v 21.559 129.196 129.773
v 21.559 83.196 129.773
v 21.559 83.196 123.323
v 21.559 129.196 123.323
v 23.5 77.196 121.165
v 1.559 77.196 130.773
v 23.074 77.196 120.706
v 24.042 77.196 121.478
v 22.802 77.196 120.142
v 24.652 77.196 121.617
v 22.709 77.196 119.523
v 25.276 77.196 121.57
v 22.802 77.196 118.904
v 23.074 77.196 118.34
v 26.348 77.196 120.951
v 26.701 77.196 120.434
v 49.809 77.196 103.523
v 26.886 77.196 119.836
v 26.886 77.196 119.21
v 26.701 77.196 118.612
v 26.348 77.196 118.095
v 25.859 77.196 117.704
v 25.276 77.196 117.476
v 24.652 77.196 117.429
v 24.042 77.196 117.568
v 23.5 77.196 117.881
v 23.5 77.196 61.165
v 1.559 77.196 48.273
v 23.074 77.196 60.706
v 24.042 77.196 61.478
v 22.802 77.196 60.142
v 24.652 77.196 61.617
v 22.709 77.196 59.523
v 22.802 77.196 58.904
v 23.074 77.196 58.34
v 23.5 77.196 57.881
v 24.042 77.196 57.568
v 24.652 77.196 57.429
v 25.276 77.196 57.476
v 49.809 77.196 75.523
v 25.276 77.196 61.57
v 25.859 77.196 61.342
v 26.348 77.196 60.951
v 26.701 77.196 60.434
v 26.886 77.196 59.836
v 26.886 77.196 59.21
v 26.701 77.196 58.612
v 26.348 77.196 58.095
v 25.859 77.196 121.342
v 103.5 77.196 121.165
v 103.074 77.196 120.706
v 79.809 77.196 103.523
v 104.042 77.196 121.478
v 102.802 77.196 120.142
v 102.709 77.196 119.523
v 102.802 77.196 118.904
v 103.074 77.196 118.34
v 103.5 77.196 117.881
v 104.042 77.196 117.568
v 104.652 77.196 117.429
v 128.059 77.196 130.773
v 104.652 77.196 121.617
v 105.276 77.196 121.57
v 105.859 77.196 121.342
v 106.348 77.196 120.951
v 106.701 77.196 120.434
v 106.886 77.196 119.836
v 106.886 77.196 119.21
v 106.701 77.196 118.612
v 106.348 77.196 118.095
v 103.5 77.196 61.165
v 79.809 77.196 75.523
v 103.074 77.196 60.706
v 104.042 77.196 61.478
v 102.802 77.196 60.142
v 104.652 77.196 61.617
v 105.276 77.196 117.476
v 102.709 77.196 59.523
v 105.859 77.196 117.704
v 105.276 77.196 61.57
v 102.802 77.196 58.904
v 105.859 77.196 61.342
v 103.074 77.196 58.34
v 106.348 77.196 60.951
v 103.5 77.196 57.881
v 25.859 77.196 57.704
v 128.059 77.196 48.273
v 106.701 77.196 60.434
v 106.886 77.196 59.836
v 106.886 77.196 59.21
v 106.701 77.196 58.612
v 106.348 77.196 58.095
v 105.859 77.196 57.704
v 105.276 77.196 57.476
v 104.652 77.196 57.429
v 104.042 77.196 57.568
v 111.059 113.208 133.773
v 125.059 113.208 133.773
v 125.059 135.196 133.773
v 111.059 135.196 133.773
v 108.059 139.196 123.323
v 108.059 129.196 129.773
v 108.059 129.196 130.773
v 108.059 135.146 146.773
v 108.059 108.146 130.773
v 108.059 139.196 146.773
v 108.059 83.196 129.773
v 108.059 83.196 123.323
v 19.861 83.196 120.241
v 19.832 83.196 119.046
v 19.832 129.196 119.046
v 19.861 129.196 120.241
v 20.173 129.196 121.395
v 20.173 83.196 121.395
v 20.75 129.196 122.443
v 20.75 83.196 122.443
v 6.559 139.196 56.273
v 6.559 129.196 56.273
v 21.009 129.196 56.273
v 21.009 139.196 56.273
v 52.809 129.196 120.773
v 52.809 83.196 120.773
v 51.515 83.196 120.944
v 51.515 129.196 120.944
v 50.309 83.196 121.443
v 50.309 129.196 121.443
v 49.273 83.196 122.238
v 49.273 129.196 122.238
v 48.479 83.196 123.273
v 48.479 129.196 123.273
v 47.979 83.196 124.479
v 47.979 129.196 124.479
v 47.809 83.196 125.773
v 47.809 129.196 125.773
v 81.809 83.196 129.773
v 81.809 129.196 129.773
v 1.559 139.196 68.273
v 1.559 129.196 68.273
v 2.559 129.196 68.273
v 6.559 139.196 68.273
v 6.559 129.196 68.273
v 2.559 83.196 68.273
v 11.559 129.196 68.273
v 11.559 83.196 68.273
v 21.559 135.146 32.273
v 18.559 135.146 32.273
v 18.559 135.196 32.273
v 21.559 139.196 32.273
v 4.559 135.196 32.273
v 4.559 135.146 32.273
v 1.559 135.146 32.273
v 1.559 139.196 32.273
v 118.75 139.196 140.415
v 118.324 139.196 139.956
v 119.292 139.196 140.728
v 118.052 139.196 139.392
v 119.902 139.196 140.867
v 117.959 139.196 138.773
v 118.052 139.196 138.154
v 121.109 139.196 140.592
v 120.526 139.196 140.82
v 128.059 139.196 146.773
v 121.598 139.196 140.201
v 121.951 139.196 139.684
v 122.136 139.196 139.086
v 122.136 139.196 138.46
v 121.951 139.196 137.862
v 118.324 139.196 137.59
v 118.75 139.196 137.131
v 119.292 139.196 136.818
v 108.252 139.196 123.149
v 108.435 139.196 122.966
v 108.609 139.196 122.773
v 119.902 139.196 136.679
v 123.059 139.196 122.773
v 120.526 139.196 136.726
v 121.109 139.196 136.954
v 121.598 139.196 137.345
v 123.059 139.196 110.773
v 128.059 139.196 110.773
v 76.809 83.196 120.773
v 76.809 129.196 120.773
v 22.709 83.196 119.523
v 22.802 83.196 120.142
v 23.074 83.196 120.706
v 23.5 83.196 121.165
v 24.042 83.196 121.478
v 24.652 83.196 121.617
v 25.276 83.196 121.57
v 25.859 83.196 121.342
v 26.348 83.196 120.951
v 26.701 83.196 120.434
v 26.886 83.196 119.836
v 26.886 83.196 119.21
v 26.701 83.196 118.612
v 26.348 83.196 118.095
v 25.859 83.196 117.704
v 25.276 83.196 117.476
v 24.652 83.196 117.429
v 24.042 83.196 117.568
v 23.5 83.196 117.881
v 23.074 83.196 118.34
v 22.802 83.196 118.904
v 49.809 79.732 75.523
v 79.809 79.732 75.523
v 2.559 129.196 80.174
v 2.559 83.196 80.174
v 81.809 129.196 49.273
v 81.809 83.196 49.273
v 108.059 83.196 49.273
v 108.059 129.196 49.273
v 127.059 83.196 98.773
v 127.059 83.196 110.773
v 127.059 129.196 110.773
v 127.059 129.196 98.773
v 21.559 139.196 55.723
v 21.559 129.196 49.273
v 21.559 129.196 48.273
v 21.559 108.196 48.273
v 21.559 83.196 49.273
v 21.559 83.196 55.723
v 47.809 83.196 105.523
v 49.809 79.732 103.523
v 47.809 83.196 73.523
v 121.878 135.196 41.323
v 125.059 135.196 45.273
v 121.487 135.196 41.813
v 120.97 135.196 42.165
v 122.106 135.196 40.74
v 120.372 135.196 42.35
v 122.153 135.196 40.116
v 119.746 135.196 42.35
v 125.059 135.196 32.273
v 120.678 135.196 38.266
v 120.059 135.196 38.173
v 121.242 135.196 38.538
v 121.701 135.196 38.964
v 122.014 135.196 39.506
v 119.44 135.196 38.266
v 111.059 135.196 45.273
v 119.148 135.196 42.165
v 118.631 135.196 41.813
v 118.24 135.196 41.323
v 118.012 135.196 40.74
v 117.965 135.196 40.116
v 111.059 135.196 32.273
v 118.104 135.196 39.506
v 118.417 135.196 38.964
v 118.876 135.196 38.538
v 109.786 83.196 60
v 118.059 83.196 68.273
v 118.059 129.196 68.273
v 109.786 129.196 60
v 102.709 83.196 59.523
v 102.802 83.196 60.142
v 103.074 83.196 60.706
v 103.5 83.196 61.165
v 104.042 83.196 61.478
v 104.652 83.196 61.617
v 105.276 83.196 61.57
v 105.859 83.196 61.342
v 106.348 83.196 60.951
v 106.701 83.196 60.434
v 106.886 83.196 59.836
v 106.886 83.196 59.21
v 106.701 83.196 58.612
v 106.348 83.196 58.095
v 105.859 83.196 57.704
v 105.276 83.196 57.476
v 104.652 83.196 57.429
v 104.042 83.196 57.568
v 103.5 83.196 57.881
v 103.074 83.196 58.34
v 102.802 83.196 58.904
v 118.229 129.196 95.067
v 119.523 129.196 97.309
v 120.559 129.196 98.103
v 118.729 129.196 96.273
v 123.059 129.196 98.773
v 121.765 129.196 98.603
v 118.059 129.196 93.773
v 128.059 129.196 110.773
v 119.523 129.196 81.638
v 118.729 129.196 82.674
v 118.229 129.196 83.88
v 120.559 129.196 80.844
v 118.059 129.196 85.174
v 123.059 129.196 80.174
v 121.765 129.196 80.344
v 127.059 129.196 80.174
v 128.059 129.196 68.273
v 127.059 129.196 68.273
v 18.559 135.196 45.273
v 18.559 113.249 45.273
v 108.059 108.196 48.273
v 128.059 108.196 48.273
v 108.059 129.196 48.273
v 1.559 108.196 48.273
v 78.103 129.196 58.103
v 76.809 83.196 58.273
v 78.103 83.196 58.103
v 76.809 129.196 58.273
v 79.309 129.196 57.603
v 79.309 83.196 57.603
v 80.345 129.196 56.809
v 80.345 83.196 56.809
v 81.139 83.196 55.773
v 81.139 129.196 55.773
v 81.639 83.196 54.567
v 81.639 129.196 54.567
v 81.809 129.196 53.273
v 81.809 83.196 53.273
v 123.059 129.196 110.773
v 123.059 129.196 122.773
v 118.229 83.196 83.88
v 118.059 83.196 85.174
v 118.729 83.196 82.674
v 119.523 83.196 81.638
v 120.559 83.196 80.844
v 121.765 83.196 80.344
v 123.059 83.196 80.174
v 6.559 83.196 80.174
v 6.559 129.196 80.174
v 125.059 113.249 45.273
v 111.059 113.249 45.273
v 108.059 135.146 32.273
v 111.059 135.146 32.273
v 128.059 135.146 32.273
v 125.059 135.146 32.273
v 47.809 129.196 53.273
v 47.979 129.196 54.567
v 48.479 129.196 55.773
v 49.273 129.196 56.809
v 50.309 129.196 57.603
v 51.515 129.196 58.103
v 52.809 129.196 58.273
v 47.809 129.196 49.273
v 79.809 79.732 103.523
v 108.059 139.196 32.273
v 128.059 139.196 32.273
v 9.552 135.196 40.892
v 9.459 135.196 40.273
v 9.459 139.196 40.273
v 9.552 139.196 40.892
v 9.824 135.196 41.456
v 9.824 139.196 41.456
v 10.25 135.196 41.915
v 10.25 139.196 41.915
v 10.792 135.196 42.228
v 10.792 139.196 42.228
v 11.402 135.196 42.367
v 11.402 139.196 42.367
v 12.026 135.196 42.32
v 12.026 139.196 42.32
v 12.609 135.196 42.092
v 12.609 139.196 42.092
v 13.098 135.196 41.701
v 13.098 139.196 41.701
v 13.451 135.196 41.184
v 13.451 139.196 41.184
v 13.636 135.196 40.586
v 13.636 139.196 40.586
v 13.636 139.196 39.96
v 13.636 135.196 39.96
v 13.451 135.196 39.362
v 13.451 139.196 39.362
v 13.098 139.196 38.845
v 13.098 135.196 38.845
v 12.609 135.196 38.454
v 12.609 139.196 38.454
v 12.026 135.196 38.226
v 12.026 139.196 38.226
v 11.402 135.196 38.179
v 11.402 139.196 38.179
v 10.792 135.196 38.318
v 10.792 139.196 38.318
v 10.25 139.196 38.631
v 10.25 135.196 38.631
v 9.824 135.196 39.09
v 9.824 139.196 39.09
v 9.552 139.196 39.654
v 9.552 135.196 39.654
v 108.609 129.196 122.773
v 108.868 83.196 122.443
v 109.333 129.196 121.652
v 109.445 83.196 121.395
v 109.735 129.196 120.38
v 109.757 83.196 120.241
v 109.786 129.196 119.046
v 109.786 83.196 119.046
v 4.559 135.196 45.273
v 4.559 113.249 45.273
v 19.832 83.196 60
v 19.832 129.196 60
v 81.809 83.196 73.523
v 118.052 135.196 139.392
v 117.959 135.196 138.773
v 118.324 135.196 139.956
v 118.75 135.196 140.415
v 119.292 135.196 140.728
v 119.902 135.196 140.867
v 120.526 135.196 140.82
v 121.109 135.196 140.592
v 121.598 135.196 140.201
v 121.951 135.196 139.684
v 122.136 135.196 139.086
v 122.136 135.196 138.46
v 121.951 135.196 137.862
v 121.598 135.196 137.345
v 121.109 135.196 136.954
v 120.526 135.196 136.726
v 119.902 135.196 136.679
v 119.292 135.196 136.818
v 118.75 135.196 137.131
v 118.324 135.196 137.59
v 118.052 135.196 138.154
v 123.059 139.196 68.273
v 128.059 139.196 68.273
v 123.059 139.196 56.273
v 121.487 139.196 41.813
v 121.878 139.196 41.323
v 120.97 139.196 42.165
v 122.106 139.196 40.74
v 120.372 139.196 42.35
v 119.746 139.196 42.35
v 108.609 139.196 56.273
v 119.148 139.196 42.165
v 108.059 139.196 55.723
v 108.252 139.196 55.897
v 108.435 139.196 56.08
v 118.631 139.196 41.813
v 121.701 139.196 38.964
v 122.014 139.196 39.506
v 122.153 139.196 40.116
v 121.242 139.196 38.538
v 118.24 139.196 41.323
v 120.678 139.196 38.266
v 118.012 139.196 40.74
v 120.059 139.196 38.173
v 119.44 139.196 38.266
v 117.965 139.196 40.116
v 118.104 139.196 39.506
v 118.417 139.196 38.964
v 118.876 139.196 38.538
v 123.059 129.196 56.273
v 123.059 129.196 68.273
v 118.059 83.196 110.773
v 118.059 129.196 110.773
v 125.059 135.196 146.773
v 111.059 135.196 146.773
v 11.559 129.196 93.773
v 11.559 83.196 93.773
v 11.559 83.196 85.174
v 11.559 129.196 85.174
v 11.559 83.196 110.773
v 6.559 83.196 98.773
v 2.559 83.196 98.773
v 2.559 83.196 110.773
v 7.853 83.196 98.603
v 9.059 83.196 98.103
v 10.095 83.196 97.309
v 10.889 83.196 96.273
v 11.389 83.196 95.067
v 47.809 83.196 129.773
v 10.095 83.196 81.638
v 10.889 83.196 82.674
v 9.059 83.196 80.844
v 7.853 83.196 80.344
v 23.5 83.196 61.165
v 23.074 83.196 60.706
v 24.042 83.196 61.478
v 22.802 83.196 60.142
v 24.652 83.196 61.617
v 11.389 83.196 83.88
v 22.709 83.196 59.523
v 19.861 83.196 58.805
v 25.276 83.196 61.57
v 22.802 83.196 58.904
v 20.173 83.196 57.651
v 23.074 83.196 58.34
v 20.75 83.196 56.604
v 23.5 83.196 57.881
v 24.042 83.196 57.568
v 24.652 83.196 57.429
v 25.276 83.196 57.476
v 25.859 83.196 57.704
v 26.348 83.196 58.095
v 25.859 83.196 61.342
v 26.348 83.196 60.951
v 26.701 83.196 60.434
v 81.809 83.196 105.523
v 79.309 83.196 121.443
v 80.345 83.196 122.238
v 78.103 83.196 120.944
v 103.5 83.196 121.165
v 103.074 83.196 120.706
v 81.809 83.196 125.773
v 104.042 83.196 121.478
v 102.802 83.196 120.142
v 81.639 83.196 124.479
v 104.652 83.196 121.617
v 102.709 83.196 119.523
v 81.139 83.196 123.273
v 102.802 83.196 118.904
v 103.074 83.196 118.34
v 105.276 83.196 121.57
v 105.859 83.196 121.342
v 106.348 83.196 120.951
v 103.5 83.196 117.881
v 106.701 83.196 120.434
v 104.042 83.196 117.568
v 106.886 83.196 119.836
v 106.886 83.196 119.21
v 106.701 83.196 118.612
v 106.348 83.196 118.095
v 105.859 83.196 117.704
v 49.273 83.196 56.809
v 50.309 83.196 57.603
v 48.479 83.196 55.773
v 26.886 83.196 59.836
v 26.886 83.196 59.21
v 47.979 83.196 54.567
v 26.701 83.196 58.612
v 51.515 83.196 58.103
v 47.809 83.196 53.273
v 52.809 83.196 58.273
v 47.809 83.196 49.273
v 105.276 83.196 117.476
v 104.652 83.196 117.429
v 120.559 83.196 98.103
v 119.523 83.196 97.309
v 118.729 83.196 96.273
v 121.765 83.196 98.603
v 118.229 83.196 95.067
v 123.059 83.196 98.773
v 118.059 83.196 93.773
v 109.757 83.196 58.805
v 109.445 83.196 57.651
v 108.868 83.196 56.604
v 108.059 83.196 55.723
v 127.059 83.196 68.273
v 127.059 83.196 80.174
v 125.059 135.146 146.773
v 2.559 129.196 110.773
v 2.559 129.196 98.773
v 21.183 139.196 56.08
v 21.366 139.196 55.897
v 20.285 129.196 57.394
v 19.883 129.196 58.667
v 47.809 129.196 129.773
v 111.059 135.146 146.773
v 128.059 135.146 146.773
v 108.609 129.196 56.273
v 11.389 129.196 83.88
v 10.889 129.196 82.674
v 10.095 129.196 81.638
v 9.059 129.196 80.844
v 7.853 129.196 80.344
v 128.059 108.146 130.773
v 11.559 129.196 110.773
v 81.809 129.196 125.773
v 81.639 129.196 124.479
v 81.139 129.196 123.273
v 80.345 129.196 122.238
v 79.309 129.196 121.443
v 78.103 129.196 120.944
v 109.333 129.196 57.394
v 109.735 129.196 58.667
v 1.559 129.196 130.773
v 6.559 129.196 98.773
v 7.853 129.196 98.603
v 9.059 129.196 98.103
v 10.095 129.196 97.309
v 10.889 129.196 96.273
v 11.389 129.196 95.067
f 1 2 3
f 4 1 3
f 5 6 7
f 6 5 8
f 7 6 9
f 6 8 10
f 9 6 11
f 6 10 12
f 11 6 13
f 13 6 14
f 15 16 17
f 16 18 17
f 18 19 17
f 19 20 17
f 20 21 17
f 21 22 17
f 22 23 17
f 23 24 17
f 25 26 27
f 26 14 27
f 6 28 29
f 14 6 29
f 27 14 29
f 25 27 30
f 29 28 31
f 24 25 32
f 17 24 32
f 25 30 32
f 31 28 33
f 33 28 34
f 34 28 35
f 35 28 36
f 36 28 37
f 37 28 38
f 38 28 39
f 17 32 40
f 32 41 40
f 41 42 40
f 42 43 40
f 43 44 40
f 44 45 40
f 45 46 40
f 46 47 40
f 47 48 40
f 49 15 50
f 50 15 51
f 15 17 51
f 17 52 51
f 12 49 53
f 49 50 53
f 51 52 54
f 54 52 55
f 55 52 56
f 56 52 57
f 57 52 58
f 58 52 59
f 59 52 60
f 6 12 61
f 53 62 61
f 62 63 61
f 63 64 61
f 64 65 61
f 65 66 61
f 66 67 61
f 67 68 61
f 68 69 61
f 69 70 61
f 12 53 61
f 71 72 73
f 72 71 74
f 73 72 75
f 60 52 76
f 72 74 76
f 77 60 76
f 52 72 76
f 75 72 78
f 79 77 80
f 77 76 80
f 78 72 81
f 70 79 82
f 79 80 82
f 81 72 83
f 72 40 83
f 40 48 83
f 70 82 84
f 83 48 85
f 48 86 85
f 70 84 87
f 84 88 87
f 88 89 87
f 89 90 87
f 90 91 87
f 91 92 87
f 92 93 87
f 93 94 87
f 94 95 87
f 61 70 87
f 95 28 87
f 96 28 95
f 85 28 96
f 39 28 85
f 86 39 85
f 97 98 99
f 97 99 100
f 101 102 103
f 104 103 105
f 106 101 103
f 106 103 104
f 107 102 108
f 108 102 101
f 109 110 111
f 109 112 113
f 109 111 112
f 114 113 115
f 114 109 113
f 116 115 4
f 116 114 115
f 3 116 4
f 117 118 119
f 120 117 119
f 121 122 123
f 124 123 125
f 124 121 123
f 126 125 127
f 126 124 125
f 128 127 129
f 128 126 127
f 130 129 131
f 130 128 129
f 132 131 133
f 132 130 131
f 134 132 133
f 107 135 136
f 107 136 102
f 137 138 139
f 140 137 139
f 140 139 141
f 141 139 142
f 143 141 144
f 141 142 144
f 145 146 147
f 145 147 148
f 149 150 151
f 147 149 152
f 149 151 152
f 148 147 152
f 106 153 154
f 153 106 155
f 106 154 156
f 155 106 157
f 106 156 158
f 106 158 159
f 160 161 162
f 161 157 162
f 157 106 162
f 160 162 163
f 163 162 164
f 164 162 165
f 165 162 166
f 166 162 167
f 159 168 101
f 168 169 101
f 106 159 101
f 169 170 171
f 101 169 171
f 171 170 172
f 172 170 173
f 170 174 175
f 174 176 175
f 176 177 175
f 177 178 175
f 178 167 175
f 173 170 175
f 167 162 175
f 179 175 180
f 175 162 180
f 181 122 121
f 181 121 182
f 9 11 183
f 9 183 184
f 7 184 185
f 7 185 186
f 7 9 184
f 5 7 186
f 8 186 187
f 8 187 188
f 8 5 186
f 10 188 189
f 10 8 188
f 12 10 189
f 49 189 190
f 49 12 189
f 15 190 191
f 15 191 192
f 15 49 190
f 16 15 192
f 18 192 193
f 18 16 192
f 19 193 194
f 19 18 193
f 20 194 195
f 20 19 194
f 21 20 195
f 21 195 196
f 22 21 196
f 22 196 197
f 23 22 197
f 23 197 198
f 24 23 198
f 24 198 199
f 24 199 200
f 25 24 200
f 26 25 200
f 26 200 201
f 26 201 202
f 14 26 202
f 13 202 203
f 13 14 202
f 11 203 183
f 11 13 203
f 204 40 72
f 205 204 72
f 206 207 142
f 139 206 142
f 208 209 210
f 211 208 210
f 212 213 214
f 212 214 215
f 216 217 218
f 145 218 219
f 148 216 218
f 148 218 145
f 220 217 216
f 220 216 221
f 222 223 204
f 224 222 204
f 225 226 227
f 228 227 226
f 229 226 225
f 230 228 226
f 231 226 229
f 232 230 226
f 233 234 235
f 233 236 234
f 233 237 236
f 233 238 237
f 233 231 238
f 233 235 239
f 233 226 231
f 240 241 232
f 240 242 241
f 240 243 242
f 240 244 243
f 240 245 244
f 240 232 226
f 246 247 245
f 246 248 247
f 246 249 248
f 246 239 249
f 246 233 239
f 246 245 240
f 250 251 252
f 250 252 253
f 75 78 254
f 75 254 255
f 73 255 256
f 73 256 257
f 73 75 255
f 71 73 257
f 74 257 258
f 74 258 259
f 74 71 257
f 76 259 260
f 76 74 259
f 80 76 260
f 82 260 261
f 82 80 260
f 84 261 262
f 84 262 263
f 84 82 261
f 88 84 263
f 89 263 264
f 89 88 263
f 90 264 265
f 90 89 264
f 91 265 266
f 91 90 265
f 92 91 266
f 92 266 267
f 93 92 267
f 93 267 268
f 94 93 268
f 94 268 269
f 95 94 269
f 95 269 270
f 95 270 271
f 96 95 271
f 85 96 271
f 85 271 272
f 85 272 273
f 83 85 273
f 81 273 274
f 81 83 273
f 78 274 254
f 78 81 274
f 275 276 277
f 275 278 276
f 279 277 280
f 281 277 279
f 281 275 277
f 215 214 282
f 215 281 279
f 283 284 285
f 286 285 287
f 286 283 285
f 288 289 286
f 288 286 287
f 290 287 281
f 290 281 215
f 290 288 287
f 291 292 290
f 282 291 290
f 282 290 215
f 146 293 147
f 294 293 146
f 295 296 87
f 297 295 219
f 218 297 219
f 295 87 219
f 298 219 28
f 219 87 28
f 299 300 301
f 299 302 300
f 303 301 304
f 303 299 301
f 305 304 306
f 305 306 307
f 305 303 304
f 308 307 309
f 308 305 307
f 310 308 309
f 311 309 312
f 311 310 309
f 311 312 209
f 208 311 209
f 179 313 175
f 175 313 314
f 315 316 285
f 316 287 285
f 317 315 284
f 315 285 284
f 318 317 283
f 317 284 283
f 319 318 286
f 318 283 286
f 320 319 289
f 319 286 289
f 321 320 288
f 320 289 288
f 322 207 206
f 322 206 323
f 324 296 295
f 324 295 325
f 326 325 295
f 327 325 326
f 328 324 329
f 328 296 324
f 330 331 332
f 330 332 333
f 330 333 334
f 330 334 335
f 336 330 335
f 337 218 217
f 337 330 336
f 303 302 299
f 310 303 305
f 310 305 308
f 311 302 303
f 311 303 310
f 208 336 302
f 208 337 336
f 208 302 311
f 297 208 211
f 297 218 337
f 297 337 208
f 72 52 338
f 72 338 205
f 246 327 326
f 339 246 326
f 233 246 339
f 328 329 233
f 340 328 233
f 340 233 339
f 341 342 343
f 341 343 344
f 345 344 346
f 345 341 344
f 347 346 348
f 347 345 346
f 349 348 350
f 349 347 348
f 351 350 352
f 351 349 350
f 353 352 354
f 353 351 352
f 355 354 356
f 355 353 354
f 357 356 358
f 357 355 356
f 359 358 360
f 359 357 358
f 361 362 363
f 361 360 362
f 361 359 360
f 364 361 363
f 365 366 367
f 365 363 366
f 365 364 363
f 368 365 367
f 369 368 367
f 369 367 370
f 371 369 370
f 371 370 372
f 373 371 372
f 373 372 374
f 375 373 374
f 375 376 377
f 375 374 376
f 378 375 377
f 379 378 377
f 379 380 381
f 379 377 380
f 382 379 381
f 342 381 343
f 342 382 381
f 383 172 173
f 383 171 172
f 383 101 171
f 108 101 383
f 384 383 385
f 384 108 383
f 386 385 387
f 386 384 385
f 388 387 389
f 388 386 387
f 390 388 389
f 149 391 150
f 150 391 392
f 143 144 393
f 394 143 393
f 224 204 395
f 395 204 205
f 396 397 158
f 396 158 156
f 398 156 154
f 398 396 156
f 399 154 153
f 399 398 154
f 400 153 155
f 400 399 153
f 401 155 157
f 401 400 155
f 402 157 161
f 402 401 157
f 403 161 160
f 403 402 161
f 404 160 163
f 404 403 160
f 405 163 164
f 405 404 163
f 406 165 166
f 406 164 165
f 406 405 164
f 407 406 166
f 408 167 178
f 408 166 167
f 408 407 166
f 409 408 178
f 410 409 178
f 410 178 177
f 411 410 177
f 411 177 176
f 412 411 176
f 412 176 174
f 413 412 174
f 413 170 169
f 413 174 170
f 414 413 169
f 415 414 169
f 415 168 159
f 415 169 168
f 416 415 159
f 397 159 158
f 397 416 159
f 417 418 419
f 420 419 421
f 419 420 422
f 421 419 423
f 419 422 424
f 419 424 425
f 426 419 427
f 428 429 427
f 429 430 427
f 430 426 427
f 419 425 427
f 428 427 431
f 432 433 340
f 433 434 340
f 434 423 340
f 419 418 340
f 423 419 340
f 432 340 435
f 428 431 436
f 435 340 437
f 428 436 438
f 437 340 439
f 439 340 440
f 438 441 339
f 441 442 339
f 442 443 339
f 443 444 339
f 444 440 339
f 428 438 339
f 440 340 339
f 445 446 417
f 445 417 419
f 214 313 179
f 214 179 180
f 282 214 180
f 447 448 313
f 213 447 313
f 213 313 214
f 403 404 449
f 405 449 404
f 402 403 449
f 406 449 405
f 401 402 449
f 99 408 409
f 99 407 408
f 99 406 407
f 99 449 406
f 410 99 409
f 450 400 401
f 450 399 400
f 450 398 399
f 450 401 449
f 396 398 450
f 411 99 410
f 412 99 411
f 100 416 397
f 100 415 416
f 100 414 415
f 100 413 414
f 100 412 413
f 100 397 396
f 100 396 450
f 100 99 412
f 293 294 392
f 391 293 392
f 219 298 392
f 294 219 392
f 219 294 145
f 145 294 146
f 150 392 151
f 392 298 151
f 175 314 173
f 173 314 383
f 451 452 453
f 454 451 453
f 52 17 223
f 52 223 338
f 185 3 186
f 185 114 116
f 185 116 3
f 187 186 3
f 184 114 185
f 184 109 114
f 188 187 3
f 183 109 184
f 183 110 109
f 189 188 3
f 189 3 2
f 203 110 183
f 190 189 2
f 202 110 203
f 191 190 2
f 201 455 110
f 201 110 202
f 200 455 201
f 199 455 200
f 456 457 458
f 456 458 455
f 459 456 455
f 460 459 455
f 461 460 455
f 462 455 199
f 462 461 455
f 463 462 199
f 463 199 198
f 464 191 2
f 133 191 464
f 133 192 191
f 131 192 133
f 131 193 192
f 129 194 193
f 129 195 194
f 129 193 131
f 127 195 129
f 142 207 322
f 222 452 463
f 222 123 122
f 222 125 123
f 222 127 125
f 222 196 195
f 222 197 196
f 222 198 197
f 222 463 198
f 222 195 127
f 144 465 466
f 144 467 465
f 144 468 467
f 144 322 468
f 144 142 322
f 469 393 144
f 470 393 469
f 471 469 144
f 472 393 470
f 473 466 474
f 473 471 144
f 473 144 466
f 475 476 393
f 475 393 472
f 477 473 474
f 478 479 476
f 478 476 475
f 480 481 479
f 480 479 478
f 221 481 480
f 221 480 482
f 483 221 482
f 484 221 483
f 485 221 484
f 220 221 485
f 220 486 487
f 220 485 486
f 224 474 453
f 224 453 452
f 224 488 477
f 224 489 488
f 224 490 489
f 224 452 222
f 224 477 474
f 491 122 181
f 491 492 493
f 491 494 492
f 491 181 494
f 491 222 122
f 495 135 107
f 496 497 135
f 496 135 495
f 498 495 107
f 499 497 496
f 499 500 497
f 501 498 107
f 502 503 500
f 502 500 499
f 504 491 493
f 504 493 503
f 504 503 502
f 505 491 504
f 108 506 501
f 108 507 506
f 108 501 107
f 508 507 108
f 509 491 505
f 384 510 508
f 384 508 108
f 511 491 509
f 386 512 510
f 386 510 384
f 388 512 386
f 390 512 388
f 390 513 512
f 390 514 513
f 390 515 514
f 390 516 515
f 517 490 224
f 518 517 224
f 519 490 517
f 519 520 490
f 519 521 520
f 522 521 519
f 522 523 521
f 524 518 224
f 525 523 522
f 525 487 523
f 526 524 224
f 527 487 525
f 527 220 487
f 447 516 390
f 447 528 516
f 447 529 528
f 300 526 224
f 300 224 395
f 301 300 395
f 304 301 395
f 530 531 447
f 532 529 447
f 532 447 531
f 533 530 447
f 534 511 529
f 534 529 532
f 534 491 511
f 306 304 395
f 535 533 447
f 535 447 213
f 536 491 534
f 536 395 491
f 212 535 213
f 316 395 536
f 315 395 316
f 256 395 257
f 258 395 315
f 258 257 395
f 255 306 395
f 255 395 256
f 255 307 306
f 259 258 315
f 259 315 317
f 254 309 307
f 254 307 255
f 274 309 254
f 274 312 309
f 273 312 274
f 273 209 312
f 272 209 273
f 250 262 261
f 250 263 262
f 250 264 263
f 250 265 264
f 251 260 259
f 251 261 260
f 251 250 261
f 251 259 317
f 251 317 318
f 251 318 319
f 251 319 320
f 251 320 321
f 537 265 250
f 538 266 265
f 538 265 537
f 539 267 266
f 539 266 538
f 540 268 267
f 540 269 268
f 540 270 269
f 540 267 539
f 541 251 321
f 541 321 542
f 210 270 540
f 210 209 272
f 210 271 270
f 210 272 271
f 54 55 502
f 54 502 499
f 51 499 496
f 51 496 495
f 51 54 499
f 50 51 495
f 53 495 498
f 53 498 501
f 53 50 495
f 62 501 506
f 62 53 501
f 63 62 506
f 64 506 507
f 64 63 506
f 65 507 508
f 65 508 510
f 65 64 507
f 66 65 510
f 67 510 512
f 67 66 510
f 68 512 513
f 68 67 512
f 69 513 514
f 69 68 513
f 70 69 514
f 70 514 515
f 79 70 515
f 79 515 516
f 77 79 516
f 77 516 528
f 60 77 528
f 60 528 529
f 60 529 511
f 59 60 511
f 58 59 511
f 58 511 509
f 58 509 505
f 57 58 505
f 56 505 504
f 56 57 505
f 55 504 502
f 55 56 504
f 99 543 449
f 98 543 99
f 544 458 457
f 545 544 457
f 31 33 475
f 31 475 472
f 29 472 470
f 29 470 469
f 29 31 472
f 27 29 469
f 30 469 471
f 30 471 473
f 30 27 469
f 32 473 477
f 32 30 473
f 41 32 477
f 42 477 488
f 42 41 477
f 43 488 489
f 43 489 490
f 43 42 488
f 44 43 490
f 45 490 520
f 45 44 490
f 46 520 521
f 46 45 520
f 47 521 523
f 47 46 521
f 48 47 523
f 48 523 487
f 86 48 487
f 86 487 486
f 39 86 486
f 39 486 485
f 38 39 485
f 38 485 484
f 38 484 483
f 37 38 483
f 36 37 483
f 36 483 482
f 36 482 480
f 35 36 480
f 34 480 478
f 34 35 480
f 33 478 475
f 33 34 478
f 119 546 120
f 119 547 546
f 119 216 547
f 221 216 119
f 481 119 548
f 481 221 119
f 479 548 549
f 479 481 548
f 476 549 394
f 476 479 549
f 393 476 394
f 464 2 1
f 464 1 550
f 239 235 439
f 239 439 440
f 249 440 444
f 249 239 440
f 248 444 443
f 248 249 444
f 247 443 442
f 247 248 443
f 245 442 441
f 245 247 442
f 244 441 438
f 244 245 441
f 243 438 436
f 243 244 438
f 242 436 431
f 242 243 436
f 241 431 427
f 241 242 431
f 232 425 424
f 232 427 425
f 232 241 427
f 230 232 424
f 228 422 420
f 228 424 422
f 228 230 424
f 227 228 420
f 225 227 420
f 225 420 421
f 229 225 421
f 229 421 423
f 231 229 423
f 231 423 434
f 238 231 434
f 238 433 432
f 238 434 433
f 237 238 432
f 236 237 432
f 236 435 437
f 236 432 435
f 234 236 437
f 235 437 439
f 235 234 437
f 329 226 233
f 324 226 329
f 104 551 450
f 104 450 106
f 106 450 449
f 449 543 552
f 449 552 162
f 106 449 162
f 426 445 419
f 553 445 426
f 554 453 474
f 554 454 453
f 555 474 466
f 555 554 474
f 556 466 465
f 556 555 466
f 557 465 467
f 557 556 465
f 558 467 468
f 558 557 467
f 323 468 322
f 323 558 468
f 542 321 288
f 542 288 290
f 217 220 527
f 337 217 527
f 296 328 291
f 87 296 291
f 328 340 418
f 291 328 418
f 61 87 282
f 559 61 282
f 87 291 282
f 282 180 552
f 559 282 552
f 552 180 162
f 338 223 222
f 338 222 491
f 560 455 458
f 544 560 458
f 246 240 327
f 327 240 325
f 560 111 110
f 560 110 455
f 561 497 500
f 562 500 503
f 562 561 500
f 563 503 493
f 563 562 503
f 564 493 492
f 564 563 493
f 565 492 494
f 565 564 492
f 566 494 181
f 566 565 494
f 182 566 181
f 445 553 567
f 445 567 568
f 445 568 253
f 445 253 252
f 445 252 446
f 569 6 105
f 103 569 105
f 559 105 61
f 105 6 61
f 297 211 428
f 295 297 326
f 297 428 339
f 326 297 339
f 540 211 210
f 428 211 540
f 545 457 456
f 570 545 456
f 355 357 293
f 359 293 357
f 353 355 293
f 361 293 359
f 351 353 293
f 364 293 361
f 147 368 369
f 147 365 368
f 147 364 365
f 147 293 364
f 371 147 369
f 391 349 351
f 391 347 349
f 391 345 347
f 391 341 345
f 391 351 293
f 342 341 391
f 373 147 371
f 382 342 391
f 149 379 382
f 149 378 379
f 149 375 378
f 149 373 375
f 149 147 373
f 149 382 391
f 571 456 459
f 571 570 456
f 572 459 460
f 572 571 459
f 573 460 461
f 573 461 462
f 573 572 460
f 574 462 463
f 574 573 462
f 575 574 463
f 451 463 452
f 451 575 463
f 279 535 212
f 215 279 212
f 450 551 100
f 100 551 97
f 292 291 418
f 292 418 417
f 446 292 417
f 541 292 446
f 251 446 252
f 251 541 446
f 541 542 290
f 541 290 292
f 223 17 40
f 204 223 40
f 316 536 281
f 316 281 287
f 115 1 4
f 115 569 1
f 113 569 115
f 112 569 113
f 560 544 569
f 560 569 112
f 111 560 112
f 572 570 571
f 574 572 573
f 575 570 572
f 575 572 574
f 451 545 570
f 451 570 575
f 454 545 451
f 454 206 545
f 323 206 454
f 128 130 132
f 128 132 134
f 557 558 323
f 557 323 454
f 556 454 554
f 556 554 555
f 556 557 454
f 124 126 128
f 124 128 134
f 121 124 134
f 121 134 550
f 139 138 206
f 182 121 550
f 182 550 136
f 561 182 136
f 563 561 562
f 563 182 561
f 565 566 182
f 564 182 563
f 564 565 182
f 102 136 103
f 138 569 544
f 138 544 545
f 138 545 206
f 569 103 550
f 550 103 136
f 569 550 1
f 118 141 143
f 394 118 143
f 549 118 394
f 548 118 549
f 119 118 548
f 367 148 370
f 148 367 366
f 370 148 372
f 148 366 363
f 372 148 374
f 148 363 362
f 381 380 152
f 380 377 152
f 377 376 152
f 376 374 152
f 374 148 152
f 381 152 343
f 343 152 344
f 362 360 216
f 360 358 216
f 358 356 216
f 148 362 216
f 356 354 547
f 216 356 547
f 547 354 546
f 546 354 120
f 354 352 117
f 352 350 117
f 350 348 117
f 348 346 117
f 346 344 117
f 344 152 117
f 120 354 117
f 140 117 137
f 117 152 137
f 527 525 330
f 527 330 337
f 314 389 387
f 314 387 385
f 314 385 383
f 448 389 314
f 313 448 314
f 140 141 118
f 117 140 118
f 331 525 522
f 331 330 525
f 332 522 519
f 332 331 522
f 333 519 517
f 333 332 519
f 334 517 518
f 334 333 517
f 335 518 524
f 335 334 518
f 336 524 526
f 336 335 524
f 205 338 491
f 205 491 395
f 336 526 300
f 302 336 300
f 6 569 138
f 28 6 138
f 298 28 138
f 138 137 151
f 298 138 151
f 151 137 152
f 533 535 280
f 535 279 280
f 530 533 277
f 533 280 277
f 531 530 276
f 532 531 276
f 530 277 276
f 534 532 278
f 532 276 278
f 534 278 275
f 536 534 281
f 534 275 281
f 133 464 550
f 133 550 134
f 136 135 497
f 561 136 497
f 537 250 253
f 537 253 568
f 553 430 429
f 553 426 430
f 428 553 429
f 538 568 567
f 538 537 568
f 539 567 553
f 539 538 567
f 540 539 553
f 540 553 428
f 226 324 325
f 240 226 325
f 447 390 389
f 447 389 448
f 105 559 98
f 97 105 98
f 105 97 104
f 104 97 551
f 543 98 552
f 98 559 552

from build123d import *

# Parameters (mm, degrees)
SKETCH_1_W               = 126.5
SKETCH_1_H               = 82.5
SKETCH_1_R               = 2.1
SKETCH_1_W_2             = 30
SKETCH_1_H_2             = 28
EXTRUDE_2_DEPTH          = 6
CHAMFER_1_SIZE           = 2
CHAMFER_1_SIZE2          = 3.464101615
SKETCH_2_W               = 34
SKETCH_2_H               = 10
SKETCH_2_W_2             = 10
SKETCH_2_H_2             = 18.59934511
SKETCH_2_W_3             = 1
SKETCH_2_H_3             = 11.900654894
SKETCH_2_H_4             = 18.599345106
SKETCH_2_H_5             = 12
SKETCH_2_W_4             = 26.25
SKETCH_2_H_6             = 1
SKETCH_2_H_7             = 11.999999996
EXTRUDE_3_DEPTH          = 46
EXTRUDE_4_DEPTH          = 10
EXTRUDE_7_DEPTH          = 20
EXTRUDE_8_DEPTH          = 20
CUT_EXTRUDE_1_DEPTH      = 205.414906938
CUT_EXTRUDE_1_DEPTH_BACK = 205.414906938
SKETCH_6_R               = 2.1
SKETCH_7_W               = 14
SKETCH_7_H               = 13.763943164
SKETCH_7_H_2             = 13.67346934
SKETCH_7_H_3             = 14.015580363
SKETCH_7_H_4             = 13.891937121
CUT_EXTRUDE_2_DEPTH      = 58
FILLET_1_R               = 5
SKETCH_9_R               = 5
CUT_EXTRUDE_4_DEPTH      = 203.675736531


with BuildPart() as part:
    # Эскиз1 → Бобышка-Вытянуть2 (new body)
    with BuildSketch(Plane(origin=(0, 77.195974268, 0), x_dir=(1, 0, 0), z_dir=(0, 1, 0))):
        with Locations((64.808980694, -89.523129836)):
            Rectangle(SKETCH_1_W, SKETCH_1_H)
        with Locations(Location((24.808980694, -59.523129836, 0), (0, 0, 180))):
            Circle(SKETCH_1_R, mode=Mode.SUBTRACT)
        with Locations(Location((104.808980694, -59.523129836, 0), (0, 0, 180))):
            Circle(SKETCH_1_R, mode=Mode.SUBTRACT)
        with Locations(Location((104.808980694, -119.523129836, 0), (0, 0, 180))):
            Circle(SKETCH_1_R, mode=Mode.SUBTRACT)
        with Locations(Location((24.808980694, -119.523129836, 0), (0, 0, 180))):
            Circle(SKETCH_1_R, mode=Mode.SUBTRACT)
        with Locations((64.808980694, -89.523129836)):
            Rectangle(SKETCH_1_W_2, SKETCH_1_H_2, mode=Mode.SUBTRACT)
    extrude(amount=EXTRUDE_2_DEPTH)

    # Фаска1
    chamfer_1_edges = [part.edges().sort_by_distance(p)[0] for p in [
        (49.808980694, 83.195974268, 89.523129836),
        (64.808980694, 83.195974268, 103.523129836),
        (79.808980694, 83.195974268, 89.523129836),
        (64.808980694, 83.195974268, 75.523129836),
    ]]
    chamfer_1_side = [part.faces().sort_by_distance(p)[0] for p in [
        (64.808980694, 83.195974268, 49.78337816),
    ]]
    chamfer(chamfer_1_edges, length=CHAMFER_1_SIZE, length2=CHAMFER_1_SIZE2, reference=chamfer_1_side[0])

    # Эскиз2 → Бобышка-Вытянуть3 (add)
    with BuildSketch(Plane(origin=(0, 83.195974268, 0), x_dir=(1, 0, 0), z_dir=(0, 1, 0))):
        Polygon((1.558980694, -68.273129836), (11.558980694, -68.273129836), (21.558980694, -58.273129836), (21.558980694, -48.273129836), (1.558980694, -48.273129836), align=None)
        with Locations((64.808980694, -53.273129836)):
            Rectangle(SKETCH_2_W, SKETCH_2_H)
        Polygon((118.058980694, -68.273129836), (108.058980694, -58.273129836), (108.058980694, -48.273129836), (128.058980694, -48.273129836), (128.058980694, -68.273129836), align=None)
        with Locations((123.058980694, -89.473457285)):
            Rectangle(SKETCH_2_W_2, SKETCH_2_H_2)
        Polygon((108.058980694, -120.773129836), (118.058980694, -110.773129836), (128.058980694, -110.773129836), (128.058980694, -130.773129836), (108.058980694, -130.773129836), align=None)
        with Locations((64.808980694, -125.773129836)):
            Rectangle(SKETCH_2_W, SKETCH_2_H)
        Polygon((21.558980694, -130.773129836), (21.558980694, -120.773129836), (11.558980694, -110.773129836), (1.558980694, -110.773129836), (1.558980694, -130.773129836), align=None)
        with Locations((2.058980694, -74.223457283)):
            Rectangle(SKETCH_2_W_3, SKETCH_2_H_3)
        with Locations((6.558980694, -89.473457283)):
            Rectangle(SKETCH_2_W_2, SKETCH_2_H_4)
        with Locations((2.058980694, -104.773129836)):
            Rectangle(SKETCH_2_W_3, SKETCH_2_H_5)
        with Locations((34.683980694, -130.273129836)):
            Rectangle(SKETCH_2_W_4, SKETCH_2_H_6)
        with Locations((94.933980694, -130.273129836)):
            Rectangle(SKETCH_2_W_4, SKETCH_2_H_6)
        with Locations((127.558980694, -104.773129838)):
            Rectangle(SKETCH_2_W_3, SKETCH_2_H_7)
        with Locations((127.558980694, -74.223457283)):
            Rectangle(SKETCH_2_W_3, SKETCH_2_H_3)
        with Locations((94.933980694, -48.773129836)):
            Rectangle(SKETCH_2_W_4, SKETCH_2_H_6)
        with Locations((34.683980694, -48.773129836)):
            Rectangle(SKETCH_2_W_4, SKETCH_2_H_6)
    extrude(amount=EXTRUDE_3_DEPTH)

    # Эскиз3 → Бобышка-Вытянуть4 (add)
    with BuildSketch(Plane(origin=(0, 129.195974268, 0), x_dir=(1, 0, 0), z_dir=(0, 1, 0))):
        Polygon((6.558980694, -68.273129836), (6.558980694, -56.273129836), (21.558980694, -56.273129836), (21.558980694, -48.273129836), (1.558980694, -48.273129836), (1.558980694, -68.273129836), align=None)
        Polygon((123.058980694, -68.273129836), (123.058980694, -56.273129836), (108.058980694, -56.273129836), (108.058980694, -48.273129836), (128.058980694, -48.273129836), (128.058980694, -68.273129836), align=None)
        Polygon((123.058980694, -110.773129836), (123.058980694, -122.773129836), (108.058980694, -122.773129836), (108.058980694, -130.773129836), (128.058980694, -130.773129836), (128.058980694, -110.773129836), align=None)
    extrude(amount=EXTRUDE_4_DEPTH)

    # Эскиз4 → Бобышка-Вытянуть7 (add)
    with BuildSketch(Plane.ZY.offset(-1.558980694)):
        Polygon((48.273129836, 139.195974268), (48.273129836, 108.195974268), (32.273129836, 135.145974268), (32.273129836, 139.195974268), align=None)
    extrude(amount=-EXTRUDE_7_DEPTH)

    # Эскиз5 → Бобышка-Вытянуть8 (add)
    with BuildSketch(Plane(origin=(128.058980694, 0, 0), x_dir=(0, 0, -1), z_dir=(1, 0, 0))):
        Polygon((-130.773129836, 139.195974268), (-130.773129836, 108.145974268), (-146.773129836, 135.145974268), (-146.773129836, 139.195974268), align=None)
        Polygon((-48.273129836, 139.195974268), (-48.273129836, 108.195974268), (-32.273129836, 135.145974268), (-32.273129836, 139.195974268), align=None)
    extrude(amount=-EXTRUDE_8_DEPTH)

    # Эскиз6 → Вырез-Вытянуть1 (cut, two sides: drawn at the far end of the back side and taken through both)
    with BuildSketch(Plane(origin=(0, 139.195974268, 0), x_dir=(1, 0, 0), z_dir=(0, 1, 0)).offset(-CUT_EXTRUDE_1_DEPTH_BACK)):
        with Locations(Location((120.058980694, -40.273129836, 0), (0, 0, 90))):
            Circle(SKETCH_6_R)
        with Locations(Location((11.55898069, -40.273129836, 0), (0, 0, 180))):
            Circle(SKETCH_6_R)
        with Locations((11.55898069, -138.773129836)):
            Circle(SKETCH_6_R)
        with Locations(Location((120.058980694, -138.773129836, 0), (0, 0, 180))):
            Circle(SKETCH_6_R)
    extrude(amount=CUT_EXTRUDE_1_DEPTH + CUT_EXTRUDE_1_DEPTH_BACK, mode=Mode.SUBTRACT)

    # Эскиз7 → Вырез-Вытянуть2 (cut)
    with BuildSketch(Plane(origin=(0, 77.195974268, 0), x_dir=(-1, 0, 0), z_dir=(0, -1, 0))):
        with Locations((-11.558980694, -38.391158254)):
            Rectangle(SKETCH_7_W, SKETCH_7_H)
        with Locations((-118.058980694, -38.436395166)):
            Rectangle(SKETCH_7_W, SKETCH_7_H_2)
        with Locations((-118.058980694, -140.780920018)):
            Rectangle(SKETCH_7_W, SKETCH_7_H_3)
        with Locations((-11.558980694, -140.719098397)):
            Rectangle(SKETCH_7_W, SKETCH_7_H_4)
    extrude(amount=-CUT_EXTRUDE_2_DEPTH, mode=Mode.SUBTRACT)

    # Скругление1
    fillet_1_edges = [part.edges().sort_by_distance(p)[0] for p in [
        (81.808980694, 106.195974268, 120.773129836),
        (47.808980694, 106.195974268, 120.773129836),
        (11.558980694, 106.195974268, 98.773129836),
        (11.558980694, 106.195974268, 80.17378473),
        (47.808980694, 106.195974268, 58.273129836),
        (81.808980694, 106.195974268, 58.273129836),
        (118.058980694, 106.195974268, 80.17378473),
        (118.058980694, 106.195974268, 98.77312984),
    ]]
    fillet(fillet_1_edges, radius=FILLET_1_R)

    # Эскиз9 → Вырез-Вытянуть4 (cut, through all)
    with BuildSketch(Plane(origin=(0, 83.195974268, 0), x_dir=(1, 0, 0), z_dir=(0, 1, 0))):
        with Locations((24.808980694, -59.523129836)):
            Circle(SKETCH_9_R)
        with Locations((104.808980694, -59.523129836)):
            Circle(SKETCH_9_R)
        with Locations((104.808980694, -119.523129836)):
            Circle(SKETCH_9_R)
        with Locations((24.808980694, -119.523129836)):
            Circle(SKETCH_9_R)
    extrude(amount=CUT_EXTRUDE_4_DEPTH, mode=Mode.SUBTRACT)


solid = part.part
